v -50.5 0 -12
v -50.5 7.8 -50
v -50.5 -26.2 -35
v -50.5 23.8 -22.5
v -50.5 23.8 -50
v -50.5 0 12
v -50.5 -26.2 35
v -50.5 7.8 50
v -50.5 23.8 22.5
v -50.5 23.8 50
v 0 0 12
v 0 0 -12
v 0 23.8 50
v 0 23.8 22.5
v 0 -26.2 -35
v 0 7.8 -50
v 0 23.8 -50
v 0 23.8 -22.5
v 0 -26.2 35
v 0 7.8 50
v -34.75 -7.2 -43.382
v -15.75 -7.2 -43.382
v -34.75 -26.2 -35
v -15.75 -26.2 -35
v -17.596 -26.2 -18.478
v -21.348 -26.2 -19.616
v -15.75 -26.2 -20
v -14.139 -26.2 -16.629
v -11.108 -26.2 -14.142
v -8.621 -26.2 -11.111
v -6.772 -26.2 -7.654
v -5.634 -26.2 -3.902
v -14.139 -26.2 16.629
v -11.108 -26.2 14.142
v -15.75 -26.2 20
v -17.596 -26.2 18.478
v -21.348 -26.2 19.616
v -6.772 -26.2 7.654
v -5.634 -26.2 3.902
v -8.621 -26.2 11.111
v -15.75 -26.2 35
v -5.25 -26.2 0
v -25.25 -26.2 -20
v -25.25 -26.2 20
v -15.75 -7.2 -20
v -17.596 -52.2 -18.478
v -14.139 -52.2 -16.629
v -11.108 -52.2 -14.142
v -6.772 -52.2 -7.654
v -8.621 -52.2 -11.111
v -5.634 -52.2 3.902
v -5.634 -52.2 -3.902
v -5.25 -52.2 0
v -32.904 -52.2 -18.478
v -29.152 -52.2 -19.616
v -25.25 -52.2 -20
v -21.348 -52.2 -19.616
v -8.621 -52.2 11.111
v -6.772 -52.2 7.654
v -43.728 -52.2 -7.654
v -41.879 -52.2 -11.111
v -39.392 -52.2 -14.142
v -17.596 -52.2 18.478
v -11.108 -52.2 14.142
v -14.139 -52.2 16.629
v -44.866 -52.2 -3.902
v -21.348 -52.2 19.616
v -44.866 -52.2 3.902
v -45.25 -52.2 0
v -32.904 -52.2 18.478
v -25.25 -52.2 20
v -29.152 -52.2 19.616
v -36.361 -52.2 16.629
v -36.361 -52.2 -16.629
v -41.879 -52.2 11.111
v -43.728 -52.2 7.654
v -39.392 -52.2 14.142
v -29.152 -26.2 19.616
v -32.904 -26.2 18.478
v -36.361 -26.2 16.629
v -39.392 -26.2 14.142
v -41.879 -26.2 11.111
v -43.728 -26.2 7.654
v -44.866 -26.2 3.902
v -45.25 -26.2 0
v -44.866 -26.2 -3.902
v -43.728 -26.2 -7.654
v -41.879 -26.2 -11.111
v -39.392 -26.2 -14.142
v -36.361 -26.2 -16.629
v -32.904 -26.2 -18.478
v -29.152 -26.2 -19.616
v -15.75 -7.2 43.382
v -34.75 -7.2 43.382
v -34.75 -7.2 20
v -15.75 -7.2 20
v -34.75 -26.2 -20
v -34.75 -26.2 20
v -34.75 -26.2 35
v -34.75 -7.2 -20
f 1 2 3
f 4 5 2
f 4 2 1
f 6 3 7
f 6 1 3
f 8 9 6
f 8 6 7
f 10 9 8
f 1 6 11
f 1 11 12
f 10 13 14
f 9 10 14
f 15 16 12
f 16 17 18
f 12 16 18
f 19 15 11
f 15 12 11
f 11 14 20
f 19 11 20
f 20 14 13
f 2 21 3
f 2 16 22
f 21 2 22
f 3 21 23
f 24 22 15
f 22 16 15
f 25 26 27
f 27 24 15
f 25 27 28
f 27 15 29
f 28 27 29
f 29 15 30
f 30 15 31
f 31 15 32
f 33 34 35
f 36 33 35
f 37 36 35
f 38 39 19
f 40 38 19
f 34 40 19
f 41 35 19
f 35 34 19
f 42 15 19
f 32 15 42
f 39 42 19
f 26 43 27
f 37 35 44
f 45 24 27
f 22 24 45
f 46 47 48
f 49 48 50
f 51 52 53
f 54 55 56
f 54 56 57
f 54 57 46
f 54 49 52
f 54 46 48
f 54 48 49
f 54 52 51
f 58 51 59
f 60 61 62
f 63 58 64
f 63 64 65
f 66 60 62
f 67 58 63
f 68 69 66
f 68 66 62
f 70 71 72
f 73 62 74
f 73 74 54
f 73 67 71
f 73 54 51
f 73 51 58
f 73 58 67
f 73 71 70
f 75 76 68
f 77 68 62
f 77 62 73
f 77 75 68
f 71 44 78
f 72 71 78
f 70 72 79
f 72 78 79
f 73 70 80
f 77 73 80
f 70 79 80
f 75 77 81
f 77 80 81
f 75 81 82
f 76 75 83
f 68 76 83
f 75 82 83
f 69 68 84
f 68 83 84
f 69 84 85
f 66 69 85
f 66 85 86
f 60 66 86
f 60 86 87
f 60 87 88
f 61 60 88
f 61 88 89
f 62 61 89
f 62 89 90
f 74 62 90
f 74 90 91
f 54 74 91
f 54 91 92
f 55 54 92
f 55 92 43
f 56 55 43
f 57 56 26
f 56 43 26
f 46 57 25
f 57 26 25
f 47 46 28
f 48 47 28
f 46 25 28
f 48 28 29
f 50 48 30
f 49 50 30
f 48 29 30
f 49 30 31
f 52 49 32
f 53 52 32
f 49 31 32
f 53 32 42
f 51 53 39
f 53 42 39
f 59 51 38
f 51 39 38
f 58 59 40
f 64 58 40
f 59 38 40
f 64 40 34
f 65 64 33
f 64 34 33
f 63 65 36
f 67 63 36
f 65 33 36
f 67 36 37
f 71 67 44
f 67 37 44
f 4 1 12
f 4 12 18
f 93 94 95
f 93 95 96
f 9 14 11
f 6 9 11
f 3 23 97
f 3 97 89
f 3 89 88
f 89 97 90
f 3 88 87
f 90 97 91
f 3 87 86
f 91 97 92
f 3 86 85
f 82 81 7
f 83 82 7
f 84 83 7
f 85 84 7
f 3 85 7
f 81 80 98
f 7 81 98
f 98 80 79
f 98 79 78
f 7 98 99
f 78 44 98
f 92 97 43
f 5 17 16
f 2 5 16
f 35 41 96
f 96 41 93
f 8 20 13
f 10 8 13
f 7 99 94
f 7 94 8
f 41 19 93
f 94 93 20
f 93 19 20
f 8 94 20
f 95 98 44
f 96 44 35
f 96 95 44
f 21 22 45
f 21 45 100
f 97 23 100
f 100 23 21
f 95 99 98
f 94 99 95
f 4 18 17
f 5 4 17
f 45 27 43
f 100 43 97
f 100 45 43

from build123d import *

# Parameters (mm, degrees)
BOSS_EXTRUDE1_DEPTH = 50.5
SKETCH2_R           = 20
BOSS_EXTRUDE2_DEPTH = 26
SKETCH4_W           = 19
SKETCH4_H           = 19
CUT_EXTRUDE1_DEPTH  = 30
SKETCH5_W           = 19
SKETCH5_H           = 19
CUT_EXTRUDE2_DEPTH  = 30


with BuildPart() as part:
    # Sketch1 → Boss-Extrude1 (new body)
    with BuildSketch(Plane(origin=(0, 0, 0), x_dir=(0, 0, -1), z_dir=(1, 0, 0))):
        Polygon((-12, 0), (12, 0), (22.5, 23.8), (50, 23.8), (50, 7.8), (35, -26.2), (-35, -26.2), (-50, 7.8), (-50, 23.8), (-22.5, 23.8), align=None)
    extrude(amount=-BOSS_EXTRUDE1_DEPTH)

    # Sketch2 → Boss-Extrude2 (add)
    with BuildSketch(Plane.XZ.offset(26.2)):
        with Locations(Location((-25.25, 0, 0), (0, 0, 90))):
            Circle(SKETCH2_R)
    extrude(amount=BOSS_EXTRUDE2_DEPTH)

    # Sketch4 → Cut-Extrude1 (cut)
    with BuildSketch(Plane.XY.offset(50)):
        with Locations((-25.25, -16.7)):
            Rectangle(SKETCH4_W, SKETCH4_H)
    extrude(amount=-CUT_EXTRUDE1_DEPTH, mode=Mode.SUBTRACT)

    # Sketch5 → Cut-Extrude2 (cut)
    with BuildSketch(Plane(origin=(0, 0, -50), x_dir=(-1, 0, 0), z_dir=(0, 0, -1))):
        with Locations((25.25, -16.7)):
            Rectangle(SKETCH5_W, SKETCH5_H)
    extrude(amount=-CUT_EXTRUDE2_DEPTH, mode=Mode.SUBTRACT)


solid = part.part
